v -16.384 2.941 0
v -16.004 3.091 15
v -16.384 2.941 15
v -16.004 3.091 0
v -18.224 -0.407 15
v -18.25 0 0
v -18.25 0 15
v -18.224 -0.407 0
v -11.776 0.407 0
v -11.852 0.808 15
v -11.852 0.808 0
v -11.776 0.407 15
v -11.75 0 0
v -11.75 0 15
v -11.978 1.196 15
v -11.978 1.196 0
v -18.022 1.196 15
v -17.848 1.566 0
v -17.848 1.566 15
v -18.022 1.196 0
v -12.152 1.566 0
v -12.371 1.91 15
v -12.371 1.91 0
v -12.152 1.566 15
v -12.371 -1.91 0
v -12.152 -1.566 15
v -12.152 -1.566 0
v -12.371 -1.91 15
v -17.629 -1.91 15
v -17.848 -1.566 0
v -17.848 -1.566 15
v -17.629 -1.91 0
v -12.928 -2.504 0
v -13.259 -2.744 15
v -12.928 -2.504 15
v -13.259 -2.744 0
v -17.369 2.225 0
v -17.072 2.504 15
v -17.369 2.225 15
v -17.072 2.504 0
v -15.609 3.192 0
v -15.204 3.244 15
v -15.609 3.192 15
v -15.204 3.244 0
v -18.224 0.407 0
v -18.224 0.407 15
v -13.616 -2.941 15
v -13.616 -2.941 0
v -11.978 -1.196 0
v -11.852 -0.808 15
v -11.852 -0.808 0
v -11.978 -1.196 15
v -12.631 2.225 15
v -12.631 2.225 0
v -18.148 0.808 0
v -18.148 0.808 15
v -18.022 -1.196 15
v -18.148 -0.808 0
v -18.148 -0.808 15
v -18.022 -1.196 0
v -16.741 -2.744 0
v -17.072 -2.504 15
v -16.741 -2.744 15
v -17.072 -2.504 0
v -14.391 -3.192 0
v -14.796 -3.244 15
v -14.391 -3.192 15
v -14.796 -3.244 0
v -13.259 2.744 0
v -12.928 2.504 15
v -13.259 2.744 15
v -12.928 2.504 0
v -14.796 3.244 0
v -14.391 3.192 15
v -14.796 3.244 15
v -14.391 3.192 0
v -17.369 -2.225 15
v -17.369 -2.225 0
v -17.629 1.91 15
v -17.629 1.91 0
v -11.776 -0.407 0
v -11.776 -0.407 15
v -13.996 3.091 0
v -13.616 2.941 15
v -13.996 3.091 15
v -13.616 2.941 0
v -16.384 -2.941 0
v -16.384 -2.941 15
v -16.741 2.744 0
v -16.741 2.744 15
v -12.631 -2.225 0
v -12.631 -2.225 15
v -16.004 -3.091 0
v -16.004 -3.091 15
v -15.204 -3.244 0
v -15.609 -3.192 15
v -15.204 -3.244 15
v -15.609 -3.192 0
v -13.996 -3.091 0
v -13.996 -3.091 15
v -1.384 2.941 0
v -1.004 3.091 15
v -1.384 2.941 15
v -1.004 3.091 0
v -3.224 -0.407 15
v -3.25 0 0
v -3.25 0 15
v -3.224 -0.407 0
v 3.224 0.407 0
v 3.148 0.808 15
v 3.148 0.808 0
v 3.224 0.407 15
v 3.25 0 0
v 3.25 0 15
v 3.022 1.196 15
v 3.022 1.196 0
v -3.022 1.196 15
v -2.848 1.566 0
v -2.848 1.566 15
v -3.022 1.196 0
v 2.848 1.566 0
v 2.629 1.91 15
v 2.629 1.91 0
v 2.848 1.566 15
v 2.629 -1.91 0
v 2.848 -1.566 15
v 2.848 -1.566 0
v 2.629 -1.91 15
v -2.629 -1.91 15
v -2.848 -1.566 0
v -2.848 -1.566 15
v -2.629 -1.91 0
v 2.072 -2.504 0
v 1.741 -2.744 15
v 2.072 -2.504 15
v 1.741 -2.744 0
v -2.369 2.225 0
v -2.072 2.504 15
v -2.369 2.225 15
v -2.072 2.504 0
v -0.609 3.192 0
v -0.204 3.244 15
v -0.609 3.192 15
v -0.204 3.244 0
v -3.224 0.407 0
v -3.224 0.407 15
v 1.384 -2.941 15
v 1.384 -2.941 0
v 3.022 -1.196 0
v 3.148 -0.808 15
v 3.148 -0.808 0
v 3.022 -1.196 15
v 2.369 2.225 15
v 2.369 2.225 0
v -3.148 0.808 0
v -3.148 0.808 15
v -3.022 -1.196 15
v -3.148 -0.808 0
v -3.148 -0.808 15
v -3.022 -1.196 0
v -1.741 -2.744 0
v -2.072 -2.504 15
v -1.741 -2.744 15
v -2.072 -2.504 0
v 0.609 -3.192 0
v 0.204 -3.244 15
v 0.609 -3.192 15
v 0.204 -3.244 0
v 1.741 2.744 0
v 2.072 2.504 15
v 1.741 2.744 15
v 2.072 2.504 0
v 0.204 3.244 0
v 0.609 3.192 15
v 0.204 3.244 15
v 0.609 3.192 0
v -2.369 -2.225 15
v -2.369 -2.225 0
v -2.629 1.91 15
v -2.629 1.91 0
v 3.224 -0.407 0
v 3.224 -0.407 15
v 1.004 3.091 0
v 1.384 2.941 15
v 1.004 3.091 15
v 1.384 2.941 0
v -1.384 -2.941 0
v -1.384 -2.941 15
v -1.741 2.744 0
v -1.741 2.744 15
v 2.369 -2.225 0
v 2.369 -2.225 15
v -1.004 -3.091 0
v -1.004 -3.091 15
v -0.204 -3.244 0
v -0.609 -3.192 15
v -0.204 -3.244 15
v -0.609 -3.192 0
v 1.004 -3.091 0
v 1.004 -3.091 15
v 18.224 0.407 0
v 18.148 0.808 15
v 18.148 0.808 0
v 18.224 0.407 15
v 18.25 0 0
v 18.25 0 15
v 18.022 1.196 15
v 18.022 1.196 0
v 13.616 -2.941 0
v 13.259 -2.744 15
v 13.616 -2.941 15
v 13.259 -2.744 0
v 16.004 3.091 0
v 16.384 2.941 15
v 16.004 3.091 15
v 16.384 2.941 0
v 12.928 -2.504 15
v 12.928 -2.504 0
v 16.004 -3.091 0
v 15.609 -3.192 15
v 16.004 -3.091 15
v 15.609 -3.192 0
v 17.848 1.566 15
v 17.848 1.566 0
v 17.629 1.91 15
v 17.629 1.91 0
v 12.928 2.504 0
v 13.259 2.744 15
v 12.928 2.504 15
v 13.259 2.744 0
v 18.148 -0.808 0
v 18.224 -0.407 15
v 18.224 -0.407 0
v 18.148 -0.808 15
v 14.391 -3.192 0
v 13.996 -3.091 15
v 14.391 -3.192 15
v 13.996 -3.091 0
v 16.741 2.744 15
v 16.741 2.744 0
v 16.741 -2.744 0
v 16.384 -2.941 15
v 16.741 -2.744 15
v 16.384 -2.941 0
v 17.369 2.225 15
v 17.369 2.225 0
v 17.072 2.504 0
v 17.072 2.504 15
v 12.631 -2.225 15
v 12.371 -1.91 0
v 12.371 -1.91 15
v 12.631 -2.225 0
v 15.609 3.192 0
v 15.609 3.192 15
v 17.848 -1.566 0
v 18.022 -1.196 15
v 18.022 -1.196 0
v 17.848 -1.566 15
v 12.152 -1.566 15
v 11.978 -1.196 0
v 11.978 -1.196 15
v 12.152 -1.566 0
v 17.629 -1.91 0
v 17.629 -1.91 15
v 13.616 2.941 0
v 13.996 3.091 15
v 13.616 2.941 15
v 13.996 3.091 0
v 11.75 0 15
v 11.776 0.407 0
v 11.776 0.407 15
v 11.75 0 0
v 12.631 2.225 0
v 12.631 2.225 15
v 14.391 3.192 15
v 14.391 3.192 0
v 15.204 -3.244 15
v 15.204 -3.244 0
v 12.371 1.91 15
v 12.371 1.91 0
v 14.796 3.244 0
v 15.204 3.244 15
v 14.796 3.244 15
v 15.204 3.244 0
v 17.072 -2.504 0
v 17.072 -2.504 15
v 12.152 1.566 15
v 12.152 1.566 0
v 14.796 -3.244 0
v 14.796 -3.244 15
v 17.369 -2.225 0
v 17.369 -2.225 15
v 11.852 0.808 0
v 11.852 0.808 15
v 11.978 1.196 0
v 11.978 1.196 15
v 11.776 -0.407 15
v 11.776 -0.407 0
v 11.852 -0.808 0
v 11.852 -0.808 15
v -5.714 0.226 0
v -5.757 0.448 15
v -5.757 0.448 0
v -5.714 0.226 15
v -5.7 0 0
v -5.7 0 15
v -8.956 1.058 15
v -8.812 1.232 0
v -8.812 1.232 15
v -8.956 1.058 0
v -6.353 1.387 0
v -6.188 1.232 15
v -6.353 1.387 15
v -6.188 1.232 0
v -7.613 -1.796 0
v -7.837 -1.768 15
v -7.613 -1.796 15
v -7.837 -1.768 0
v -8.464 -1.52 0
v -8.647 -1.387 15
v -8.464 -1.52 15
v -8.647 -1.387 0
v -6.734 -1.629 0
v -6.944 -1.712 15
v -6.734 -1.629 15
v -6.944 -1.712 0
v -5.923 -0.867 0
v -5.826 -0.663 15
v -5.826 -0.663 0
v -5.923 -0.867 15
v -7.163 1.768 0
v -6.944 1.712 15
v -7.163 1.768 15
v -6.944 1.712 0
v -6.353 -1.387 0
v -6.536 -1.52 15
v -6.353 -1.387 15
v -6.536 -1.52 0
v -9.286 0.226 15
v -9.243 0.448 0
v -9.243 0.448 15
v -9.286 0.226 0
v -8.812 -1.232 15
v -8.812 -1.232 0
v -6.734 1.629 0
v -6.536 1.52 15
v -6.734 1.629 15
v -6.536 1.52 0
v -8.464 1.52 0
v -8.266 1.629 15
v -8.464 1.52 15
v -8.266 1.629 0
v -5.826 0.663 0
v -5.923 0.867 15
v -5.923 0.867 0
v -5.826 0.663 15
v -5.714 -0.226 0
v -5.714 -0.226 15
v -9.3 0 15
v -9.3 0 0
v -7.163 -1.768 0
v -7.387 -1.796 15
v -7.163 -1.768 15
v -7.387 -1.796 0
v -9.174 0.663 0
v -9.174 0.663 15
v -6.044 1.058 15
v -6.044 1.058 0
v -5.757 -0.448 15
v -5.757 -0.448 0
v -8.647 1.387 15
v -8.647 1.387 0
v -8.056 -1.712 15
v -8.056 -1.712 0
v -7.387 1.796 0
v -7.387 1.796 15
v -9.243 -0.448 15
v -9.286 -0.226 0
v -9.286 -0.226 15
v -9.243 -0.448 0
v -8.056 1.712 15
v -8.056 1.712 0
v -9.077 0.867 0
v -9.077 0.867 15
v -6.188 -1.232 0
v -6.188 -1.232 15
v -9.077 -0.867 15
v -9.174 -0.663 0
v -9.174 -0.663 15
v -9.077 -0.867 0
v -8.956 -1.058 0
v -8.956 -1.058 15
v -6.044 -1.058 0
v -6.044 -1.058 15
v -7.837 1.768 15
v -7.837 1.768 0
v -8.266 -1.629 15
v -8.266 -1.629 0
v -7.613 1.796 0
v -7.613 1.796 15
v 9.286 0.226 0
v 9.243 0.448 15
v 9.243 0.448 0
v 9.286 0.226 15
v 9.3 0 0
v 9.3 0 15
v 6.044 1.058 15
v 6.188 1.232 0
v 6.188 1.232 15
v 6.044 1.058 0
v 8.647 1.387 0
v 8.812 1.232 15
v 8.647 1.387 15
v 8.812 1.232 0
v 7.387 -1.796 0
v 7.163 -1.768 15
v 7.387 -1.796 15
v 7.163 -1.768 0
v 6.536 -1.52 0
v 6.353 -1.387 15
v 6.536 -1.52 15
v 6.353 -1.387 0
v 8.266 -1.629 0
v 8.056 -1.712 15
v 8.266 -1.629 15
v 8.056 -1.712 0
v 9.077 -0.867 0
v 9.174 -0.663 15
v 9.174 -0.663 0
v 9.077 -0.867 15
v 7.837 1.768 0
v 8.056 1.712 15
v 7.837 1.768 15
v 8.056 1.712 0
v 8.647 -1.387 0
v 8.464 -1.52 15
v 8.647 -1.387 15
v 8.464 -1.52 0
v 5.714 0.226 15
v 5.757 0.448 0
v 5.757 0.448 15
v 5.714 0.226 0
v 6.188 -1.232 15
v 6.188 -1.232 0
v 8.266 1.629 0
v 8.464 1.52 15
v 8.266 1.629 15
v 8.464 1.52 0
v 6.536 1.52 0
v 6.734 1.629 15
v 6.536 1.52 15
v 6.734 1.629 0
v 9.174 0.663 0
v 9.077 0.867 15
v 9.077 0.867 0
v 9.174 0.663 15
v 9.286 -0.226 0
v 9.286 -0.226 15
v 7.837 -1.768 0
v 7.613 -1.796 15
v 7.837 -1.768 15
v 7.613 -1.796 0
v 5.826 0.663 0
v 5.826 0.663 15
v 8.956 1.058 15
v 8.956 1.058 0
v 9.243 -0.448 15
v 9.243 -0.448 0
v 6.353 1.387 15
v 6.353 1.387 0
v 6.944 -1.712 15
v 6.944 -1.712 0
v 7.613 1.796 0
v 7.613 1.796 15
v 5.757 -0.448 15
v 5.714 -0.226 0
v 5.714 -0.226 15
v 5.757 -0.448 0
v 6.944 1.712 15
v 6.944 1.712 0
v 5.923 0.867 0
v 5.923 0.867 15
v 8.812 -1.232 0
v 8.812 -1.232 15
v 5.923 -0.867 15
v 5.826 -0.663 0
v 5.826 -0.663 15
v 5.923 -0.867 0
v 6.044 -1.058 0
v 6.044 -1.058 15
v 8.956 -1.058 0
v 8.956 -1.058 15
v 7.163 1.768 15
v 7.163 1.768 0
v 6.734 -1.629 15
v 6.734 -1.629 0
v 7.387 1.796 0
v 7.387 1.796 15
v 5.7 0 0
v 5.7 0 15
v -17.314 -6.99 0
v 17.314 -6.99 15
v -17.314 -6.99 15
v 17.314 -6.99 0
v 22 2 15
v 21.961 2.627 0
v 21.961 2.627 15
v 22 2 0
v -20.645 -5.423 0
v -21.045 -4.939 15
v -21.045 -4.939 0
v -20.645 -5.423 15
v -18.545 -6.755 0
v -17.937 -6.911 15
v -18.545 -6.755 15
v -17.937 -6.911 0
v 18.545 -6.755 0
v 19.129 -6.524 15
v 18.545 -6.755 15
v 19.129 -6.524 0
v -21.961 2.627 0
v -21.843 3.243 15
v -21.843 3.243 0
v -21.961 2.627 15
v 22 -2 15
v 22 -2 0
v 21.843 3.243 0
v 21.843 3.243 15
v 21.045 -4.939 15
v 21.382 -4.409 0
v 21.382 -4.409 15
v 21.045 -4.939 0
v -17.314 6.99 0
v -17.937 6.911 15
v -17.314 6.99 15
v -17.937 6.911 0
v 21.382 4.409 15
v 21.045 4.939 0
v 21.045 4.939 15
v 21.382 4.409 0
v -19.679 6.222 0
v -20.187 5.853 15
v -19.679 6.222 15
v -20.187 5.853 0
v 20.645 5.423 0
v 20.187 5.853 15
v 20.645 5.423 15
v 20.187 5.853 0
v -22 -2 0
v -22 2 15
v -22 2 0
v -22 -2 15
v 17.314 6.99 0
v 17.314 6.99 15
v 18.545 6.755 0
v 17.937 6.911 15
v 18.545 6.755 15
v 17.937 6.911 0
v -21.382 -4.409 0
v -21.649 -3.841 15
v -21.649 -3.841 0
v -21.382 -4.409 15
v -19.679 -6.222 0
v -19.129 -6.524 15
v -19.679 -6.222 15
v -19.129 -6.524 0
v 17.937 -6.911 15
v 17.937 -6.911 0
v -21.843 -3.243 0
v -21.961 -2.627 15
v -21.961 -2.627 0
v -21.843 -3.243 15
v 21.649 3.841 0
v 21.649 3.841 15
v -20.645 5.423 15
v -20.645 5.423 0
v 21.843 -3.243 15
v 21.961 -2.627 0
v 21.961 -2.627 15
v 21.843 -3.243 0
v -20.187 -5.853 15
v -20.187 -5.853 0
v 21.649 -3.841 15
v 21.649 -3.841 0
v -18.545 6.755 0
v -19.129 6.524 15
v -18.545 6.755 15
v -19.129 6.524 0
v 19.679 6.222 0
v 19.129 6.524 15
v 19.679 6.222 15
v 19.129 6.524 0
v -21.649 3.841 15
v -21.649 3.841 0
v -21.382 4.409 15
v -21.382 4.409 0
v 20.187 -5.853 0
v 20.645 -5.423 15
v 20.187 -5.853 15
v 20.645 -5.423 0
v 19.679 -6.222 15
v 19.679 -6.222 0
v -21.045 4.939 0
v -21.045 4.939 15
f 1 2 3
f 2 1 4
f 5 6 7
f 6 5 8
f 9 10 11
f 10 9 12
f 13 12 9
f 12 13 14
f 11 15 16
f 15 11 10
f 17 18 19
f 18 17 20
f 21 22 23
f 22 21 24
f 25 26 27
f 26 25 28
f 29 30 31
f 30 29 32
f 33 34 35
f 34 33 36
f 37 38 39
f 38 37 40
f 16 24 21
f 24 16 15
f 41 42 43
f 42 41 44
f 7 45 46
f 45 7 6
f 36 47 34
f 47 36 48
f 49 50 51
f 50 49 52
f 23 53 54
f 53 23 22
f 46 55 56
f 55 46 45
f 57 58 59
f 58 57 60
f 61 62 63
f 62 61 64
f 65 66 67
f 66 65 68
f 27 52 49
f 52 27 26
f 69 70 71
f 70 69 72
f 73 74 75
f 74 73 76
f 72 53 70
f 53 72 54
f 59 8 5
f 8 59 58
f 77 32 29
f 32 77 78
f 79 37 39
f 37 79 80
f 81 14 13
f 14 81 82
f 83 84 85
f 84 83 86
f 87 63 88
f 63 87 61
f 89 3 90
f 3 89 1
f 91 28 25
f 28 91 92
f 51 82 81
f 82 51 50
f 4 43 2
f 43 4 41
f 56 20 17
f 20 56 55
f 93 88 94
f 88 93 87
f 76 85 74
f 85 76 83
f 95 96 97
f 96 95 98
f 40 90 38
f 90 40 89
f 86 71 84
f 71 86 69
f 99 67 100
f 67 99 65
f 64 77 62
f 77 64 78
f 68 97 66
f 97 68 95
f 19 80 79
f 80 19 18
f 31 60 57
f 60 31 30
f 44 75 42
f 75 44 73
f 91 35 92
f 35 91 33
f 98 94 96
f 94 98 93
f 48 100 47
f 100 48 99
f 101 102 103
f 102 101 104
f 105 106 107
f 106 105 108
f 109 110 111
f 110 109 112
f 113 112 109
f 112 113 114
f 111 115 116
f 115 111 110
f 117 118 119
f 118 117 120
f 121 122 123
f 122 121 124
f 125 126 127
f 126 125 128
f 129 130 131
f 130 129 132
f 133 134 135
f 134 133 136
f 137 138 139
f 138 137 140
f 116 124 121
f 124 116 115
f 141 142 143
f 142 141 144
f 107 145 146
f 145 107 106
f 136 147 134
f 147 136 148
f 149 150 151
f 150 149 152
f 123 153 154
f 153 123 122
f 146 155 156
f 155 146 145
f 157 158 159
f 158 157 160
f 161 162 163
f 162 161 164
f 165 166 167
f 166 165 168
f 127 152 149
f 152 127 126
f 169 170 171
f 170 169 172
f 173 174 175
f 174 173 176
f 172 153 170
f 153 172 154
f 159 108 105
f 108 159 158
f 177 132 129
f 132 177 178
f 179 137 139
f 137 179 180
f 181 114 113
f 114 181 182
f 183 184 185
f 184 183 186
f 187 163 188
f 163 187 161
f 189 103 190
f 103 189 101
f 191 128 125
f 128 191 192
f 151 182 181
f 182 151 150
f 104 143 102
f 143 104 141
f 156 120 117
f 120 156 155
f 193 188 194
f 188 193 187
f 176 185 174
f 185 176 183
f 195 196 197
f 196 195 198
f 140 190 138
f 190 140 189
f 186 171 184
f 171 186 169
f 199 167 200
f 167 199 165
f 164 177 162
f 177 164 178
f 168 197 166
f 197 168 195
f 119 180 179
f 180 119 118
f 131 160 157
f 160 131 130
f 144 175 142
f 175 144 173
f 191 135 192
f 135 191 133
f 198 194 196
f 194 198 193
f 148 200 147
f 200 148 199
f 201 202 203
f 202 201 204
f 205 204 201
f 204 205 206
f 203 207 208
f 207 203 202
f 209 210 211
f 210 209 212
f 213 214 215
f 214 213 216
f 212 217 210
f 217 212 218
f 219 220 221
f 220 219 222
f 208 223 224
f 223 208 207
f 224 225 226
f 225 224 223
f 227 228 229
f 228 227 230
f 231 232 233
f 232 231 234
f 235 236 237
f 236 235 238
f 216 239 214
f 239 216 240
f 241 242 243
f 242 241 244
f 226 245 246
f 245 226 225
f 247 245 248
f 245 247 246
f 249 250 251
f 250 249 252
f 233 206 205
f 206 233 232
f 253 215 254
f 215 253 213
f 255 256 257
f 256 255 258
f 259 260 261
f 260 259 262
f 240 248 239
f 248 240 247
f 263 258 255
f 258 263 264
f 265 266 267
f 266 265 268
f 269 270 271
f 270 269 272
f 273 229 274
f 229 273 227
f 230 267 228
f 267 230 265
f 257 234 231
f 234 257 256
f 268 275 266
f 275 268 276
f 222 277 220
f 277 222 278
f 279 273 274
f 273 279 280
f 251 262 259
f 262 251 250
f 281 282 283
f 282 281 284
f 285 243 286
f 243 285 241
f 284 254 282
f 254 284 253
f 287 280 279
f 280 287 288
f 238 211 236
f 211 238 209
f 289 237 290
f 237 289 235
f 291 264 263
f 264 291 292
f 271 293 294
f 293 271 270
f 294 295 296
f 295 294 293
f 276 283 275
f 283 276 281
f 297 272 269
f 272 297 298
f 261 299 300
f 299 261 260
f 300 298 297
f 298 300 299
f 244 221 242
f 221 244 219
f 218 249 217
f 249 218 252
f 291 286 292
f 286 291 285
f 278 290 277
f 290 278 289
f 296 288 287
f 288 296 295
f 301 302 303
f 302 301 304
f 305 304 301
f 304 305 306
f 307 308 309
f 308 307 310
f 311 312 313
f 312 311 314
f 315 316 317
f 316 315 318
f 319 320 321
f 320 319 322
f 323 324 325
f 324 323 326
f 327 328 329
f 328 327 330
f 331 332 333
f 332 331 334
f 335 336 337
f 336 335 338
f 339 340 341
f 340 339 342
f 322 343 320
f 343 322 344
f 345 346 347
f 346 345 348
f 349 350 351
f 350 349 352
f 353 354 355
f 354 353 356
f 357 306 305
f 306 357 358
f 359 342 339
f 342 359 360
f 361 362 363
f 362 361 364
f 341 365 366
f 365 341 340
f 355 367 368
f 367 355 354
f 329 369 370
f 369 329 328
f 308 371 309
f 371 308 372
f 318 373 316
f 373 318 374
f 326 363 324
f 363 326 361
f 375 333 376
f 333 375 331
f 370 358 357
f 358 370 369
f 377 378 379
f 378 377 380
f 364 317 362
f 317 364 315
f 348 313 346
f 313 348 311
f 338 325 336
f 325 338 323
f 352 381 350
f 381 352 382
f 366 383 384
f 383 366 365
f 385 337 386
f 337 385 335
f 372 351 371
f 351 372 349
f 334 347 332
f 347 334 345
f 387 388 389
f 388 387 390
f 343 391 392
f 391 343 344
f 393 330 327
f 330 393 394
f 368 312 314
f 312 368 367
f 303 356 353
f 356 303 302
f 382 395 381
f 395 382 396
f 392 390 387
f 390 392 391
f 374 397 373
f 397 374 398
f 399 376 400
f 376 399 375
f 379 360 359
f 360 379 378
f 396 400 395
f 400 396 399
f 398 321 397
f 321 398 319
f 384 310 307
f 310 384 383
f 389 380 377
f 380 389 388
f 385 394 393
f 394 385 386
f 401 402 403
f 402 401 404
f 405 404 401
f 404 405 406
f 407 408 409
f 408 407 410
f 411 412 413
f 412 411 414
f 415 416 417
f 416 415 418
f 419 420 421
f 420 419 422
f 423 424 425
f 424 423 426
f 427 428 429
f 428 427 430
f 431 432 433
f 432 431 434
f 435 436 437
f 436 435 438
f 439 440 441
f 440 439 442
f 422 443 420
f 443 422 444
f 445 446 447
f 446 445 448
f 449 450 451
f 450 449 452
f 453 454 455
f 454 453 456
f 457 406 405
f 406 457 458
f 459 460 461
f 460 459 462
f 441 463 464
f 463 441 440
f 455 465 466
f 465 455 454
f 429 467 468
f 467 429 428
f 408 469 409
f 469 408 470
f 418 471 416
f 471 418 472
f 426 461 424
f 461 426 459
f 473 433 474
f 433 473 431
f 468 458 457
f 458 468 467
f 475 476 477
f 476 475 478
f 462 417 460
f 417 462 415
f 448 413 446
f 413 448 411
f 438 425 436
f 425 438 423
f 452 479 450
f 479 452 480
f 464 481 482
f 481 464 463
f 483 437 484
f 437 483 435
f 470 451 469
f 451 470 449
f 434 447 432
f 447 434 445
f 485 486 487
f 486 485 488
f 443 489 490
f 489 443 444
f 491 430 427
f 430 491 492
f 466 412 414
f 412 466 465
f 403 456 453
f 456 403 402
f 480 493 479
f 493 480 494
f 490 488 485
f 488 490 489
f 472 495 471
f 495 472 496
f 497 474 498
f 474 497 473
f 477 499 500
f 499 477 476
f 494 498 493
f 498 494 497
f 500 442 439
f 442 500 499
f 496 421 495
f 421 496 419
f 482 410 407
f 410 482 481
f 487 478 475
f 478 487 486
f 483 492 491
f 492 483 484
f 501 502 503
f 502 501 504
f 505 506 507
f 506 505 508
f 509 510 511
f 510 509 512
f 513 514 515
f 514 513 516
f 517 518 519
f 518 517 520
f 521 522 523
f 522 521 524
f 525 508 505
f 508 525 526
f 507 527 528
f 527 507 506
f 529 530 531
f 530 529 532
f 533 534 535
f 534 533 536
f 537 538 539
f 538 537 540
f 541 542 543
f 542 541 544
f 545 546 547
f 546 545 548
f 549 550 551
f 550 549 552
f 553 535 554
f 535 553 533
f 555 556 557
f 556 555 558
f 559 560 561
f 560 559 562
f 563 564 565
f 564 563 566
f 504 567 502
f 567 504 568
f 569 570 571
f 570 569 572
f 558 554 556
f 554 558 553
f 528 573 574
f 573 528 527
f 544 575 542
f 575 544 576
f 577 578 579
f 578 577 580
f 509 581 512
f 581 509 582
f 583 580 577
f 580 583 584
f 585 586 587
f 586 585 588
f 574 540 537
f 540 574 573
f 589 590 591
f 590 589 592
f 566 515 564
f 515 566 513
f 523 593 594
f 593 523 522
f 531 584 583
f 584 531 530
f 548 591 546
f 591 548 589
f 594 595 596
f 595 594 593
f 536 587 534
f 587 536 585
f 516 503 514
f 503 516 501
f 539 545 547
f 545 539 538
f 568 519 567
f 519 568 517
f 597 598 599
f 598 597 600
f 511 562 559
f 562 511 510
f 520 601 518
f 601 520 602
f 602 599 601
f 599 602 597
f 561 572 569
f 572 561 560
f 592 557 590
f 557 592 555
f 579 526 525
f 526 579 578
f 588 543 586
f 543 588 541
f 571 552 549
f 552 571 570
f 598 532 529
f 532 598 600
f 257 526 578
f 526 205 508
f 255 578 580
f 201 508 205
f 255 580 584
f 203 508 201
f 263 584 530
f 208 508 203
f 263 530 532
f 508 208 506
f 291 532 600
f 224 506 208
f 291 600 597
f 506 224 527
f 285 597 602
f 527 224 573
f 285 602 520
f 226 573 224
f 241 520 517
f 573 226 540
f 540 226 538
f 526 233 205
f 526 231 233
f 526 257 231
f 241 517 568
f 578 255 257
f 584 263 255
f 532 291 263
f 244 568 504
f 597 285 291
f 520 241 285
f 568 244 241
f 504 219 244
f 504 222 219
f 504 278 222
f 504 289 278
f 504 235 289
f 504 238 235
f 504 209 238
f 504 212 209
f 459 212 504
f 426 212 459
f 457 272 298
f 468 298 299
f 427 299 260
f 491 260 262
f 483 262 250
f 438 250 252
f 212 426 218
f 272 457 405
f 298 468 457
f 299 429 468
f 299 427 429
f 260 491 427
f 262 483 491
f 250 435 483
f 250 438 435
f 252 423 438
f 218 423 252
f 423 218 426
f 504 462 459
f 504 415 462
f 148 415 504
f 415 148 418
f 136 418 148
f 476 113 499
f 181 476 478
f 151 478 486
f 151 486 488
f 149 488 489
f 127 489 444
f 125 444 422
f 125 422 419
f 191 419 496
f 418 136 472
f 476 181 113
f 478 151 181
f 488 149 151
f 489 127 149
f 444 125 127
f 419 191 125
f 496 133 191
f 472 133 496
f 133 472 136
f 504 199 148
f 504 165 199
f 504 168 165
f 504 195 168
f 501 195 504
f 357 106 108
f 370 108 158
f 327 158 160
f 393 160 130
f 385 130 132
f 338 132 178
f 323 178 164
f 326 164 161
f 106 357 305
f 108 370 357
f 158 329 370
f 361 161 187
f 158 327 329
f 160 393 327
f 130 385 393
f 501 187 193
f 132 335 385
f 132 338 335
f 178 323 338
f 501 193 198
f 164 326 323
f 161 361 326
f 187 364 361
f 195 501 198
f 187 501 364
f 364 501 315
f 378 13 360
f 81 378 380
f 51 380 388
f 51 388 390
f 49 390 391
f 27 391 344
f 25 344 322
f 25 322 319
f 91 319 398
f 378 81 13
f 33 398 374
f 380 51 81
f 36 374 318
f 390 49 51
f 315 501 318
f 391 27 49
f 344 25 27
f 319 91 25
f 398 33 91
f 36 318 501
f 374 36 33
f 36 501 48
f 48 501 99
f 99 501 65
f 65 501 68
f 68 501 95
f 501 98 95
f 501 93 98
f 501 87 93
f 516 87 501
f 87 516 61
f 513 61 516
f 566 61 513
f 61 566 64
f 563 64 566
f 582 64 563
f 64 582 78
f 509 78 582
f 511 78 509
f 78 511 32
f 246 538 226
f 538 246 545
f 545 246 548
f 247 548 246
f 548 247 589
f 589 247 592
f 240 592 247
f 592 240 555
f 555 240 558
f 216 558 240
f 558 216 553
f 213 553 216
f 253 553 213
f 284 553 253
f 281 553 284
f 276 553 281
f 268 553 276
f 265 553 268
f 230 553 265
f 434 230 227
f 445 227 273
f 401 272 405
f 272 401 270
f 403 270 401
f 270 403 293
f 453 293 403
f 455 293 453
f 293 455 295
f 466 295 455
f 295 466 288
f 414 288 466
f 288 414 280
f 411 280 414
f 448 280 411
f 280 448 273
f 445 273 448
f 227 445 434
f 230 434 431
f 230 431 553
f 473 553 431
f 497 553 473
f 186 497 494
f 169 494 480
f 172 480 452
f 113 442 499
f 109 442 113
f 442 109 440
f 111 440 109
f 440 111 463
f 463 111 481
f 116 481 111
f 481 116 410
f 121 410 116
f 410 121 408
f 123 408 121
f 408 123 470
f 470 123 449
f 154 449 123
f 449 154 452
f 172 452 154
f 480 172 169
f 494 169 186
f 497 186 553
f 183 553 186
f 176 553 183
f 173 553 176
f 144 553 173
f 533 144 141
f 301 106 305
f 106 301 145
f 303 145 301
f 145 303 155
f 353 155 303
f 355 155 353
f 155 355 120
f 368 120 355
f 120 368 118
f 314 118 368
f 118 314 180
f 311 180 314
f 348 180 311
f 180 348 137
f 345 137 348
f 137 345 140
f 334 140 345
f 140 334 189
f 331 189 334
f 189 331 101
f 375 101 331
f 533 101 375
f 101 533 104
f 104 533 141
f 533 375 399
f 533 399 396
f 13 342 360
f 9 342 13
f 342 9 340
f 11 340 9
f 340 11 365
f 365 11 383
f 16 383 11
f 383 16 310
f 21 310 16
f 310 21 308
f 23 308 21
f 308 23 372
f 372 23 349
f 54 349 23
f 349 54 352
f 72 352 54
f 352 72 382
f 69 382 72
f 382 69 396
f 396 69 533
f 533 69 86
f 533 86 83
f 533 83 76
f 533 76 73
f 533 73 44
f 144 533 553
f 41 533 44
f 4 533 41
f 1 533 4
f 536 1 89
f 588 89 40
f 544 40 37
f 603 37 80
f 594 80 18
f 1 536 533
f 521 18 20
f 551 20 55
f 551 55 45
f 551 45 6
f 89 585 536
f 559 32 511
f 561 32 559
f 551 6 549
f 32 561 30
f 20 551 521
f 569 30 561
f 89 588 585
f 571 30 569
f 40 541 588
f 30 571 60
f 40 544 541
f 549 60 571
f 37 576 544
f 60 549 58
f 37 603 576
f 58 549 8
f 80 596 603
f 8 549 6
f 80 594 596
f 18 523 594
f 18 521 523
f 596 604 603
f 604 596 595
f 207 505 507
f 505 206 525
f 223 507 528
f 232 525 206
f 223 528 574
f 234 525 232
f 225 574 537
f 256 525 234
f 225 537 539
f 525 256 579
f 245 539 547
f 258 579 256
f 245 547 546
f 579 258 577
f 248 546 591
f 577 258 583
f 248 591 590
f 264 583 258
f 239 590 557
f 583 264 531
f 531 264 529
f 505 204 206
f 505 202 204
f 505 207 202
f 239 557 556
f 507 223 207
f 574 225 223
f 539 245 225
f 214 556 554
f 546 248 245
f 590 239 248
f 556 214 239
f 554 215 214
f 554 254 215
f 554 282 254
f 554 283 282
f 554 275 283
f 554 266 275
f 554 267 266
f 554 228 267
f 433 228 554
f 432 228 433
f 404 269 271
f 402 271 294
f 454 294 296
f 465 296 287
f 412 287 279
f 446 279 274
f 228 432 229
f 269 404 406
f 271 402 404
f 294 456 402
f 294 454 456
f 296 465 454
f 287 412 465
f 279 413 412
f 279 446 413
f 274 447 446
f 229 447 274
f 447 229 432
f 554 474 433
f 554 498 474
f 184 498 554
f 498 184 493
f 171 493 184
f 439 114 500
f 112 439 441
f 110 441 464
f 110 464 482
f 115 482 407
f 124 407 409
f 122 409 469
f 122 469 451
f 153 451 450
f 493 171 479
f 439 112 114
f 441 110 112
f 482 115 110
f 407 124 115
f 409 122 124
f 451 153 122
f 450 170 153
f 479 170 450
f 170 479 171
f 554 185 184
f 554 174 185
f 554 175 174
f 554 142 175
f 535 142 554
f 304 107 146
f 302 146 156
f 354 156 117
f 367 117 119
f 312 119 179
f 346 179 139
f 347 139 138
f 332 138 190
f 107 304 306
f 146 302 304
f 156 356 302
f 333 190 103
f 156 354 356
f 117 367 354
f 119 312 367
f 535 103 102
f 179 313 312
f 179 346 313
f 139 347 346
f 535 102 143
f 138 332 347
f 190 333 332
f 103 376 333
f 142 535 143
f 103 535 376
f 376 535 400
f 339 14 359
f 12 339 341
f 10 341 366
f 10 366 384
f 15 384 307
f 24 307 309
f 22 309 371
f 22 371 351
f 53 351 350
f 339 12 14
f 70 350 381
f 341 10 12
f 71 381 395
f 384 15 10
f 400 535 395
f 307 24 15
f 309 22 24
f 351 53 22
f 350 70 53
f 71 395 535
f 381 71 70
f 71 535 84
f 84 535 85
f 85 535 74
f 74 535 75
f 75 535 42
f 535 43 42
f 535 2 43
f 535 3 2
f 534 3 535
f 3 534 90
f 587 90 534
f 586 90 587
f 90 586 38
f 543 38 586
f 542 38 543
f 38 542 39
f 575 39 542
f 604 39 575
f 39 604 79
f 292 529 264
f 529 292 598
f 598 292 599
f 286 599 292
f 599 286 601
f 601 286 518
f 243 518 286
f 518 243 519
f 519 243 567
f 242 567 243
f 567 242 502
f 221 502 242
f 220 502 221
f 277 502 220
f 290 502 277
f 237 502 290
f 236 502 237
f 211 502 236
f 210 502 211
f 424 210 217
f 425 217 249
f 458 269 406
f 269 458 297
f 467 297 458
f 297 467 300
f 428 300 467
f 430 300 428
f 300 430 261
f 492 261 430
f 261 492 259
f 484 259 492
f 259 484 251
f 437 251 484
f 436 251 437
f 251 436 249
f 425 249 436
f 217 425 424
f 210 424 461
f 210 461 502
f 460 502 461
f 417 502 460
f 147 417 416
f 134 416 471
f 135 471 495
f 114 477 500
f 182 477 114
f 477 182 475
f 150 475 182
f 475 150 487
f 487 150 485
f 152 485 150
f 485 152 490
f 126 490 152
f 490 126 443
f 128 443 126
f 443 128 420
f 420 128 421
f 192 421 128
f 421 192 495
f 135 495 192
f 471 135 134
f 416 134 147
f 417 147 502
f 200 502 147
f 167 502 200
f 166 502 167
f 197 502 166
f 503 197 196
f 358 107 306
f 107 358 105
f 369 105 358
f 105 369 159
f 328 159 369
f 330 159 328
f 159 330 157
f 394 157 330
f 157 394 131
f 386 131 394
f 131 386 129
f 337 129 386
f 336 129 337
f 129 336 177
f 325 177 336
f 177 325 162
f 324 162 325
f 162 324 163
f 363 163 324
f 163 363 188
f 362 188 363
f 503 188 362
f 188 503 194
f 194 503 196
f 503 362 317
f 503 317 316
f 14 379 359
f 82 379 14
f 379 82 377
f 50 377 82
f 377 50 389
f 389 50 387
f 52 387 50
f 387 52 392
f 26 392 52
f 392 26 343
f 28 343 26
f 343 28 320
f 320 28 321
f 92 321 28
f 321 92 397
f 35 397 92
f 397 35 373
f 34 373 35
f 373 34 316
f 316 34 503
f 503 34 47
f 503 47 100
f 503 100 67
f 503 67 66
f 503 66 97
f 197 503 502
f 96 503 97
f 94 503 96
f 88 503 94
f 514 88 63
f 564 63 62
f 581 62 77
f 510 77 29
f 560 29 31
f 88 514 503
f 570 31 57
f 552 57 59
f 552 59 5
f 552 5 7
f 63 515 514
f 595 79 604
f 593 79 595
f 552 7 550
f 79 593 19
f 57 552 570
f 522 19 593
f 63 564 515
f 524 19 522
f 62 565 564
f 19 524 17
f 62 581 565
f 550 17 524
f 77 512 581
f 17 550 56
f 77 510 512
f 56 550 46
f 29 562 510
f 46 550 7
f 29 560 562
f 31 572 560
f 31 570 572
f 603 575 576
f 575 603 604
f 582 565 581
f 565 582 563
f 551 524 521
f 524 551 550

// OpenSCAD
$fn = 50;


difference() {
	union() {
		*color(alpha = 1.0000000000, c = "gray") {
			translate(v = [0, 7, 0]) {
				linear_extrude(height = 1) {
					text(font = "Arial:style=Bold", halign = "center", size = 4.5000000000, text = "COMMENT plate main", valign = "center");
				}
			}
		}
		hull() {
			translate(v = [-17.0000000000, 2.0000000000, 0]) {
				cylinder(h = 15, r = 5);
			}
			translate(v = [17.0000000000, 2.0000000000, 0]) {
				cylinder(h = 15, r = 5);
			}
			translate(v = [-17.0000000000, -2.0000000000, 0]) {
				cylinder(h = 15, r = 5);
			}
			translate(v = [17.0000000000, -2.0000000000, 0]) {
				cylinder(h = 15, r = 5);
			}
		}
	}
	union() {
		*color(alpha = 1.0000000000, c = "gray") {
			translate(v = [0, 7, 0]) {
				linear_extrude(height = 1) {
					text(font = "Arial:style=Bold", halign = "center", size = 4.5000000000, text = "COMMENT holes main", valign = "center");
				}
			}
		}
		translate(v = [-15.0000000000, 0.0000000000, 0]) {
			translate(v = [0, 0, -100]) {
				cylinder(h = 200, r = 3.2500000000);
			}
		}
		translate(v = [0, 0, -100]) {
			cylinder(h = 200, r = 3.2500000000);
		}
		translate(v = [15.0000000000, 0.0000000000, 0]) {
			translate(v = [0, 0, -100]) {
				cylinder(h = 200, r = 3.2500000000);
			}
		}
		translate(v = [-15.0000000000, 0.0000000000, 0]) {
			translate(v = [0, 0, -100]) {
				cylinder(h = 200, r = 1.8000000000);
			}
		}
		translate(v = [-7.5000000000, 0.0000000000, 0]) {
			translate(v = [0, 0, -100]) {
				cylinder(h = 200, r = 1.8000000000);
			}
		}
		translate(v = [0, 0, -100]) {
			cylinder(h = 200, r = 1.8000000000);
		}
		translate(v = [7.5000000000, 0.0000000000, 0]) {
			translate(v = [0, 0, -100]) {
				cylinder(h = 200, r = 1.8000000000);
			}
		}
		translate(v = [15.0000000000, 0.0000000000, 0]) {
			translate(v = [0, 0, -100]) {
				cylinder(h = 200, r = 1.8000000000);
			}
		}
	}
}
